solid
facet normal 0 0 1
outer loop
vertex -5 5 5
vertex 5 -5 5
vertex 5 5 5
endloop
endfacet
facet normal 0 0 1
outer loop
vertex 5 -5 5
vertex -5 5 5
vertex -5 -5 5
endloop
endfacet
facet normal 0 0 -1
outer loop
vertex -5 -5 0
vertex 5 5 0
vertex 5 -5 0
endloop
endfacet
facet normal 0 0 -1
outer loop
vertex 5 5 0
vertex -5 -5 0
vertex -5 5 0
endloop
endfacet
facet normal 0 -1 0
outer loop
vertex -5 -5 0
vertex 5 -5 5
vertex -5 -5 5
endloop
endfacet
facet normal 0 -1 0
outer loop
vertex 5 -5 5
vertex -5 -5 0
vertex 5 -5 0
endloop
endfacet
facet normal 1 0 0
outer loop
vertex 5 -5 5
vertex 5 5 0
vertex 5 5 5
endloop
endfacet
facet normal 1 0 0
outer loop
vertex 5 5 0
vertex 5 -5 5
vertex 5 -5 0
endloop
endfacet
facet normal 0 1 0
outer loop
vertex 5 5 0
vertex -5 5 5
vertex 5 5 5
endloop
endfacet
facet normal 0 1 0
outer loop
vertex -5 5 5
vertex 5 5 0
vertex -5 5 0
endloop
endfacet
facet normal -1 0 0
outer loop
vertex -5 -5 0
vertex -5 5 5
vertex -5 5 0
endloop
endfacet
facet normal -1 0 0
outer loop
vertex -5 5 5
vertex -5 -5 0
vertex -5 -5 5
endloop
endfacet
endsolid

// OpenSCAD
module CutExample2(){
  translate([-5, -5, 0])cube([10, 10, 5]);}
$fn=64;
color("DarkOliveGreen")CutExample2();
